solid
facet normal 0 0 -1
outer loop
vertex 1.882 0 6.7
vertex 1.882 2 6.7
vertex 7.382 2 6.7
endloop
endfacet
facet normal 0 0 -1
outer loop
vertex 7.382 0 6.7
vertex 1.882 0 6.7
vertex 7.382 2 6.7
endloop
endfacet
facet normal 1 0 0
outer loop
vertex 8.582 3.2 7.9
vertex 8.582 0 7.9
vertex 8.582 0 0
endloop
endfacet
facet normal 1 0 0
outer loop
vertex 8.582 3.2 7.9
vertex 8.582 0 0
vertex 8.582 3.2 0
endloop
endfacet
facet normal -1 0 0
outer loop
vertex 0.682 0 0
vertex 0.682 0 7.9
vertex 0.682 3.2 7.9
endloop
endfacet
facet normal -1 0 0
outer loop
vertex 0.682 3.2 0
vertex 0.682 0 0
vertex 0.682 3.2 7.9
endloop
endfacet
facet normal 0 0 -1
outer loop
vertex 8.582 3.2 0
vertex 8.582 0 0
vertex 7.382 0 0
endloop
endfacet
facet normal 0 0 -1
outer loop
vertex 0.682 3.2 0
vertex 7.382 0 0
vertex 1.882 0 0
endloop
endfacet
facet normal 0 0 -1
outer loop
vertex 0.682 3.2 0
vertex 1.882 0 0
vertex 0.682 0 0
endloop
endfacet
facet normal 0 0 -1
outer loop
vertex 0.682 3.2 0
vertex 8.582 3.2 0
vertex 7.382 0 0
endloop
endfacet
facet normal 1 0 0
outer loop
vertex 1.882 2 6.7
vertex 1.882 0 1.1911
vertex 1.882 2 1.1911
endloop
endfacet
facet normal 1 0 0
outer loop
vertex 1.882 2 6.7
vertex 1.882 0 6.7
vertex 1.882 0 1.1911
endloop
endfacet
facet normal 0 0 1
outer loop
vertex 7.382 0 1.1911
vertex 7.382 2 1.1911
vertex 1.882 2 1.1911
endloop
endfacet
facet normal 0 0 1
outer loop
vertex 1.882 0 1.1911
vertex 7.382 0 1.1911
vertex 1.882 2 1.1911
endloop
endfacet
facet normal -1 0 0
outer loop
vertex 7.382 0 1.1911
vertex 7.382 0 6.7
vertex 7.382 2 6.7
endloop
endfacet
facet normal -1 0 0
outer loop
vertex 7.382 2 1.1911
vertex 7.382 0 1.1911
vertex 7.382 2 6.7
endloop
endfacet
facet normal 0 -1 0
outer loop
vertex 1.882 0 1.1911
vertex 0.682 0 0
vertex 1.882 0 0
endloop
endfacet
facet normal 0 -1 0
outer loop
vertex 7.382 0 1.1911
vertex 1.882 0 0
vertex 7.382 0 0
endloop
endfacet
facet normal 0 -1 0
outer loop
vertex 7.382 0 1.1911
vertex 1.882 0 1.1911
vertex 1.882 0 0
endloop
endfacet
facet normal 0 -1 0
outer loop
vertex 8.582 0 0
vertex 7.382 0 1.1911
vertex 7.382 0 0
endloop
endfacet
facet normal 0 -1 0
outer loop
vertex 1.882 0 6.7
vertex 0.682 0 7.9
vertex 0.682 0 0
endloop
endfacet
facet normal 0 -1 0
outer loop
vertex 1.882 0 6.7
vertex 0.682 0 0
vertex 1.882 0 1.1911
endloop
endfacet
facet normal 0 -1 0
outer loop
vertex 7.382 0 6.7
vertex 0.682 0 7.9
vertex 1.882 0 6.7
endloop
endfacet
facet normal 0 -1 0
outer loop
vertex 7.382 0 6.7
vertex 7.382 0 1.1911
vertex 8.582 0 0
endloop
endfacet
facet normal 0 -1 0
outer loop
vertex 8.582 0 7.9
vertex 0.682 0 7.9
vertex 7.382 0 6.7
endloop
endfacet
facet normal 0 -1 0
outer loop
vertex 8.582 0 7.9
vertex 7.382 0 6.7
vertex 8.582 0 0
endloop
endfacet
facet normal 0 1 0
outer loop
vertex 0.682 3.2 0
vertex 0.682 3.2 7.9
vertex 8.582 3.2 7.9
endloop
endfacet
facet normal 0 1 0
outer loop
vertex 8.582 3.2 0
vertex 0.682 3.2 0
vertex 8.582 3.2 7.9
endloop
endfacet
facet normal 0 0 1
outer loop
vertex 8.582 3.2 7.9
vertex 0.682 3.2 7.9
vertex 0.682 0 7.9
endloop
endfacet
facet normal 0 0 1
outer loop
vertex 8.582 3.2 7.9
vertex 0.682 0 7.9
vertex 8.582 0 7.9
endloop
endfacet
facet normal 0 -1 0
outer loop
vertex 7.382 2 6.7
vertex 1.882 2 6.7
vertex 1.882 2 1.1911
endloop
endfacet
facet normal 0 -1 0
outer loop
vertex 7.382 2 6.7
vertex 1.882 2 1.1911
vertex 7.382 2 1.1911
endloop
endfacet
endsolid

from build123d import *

# Parameters (mm, degrees)
MAINBASESKETCH_W         = 7.9
MAINBASESKETCH_H         = 3.2
MAINBASEEXTRUDE_DEPTH    = 7.9
MAINBASESHELL_T          = -1.2
SKETCH171_W              = 5.5
SKETCH171_H              = 1.191135725
BOSS_EXTRUDE23_DEPTH     = 2
CUT_EXTRUDE58_DEPTH      = 12.83470157
CUT_EXTRUDE58_DEPTH_BACK = 12.83470157


with BuildPart() as part:
    # MainBaseSketch → MainBaseExtrude (new, symmetric)
    with BuildSketch(Plane.XY):
        with Locations((4.631967213, 1.6)):
            Rectangle(MAINBASESKETCH_W, MAINBASESKETCH_H)
    extrude(amount=MAINBASEEXTRUDE_DEPTH, both=True)

    # MainBaseShell
    mainbaseshell_openings = [part.faces().sort_by_distance(p)[0] for p in [
        (4.631967213, 0, 0),
    ]]
    offset(amount=MAINBASESHELL_T, openings=mainbaseshell_openings, kind=Kind.INTERSECTION)

    # Sketch171 → Boss-Extrude23 (add)
    with BuildSketch(Plane(origin=(0, 2, 0), x_dir=(-1, 0, 0), z_dir=(0, -1, 0))):
        with Locations((-4.631967213, -0.595567863)):
            Rectangle(SKETCH171_W, SKETCH171_H)
    extrude(amount=BOSS_EXTRUDE23_DEPTH)

    # Sketch173 → Cut-Extrude58 (cut, two sides: drawn at the far end of the back side and taken through both)
    with BuildSketch(Plane(origin=(0, 2, 0), x_dir=(-1, 0, 0), z_dir=(0, -1, 0)).offset(-CUT_EXTRUDE58_DEPTH_BACK)):
        Polygon((-7.381967213, 0), (-8.581967213, 0), (-8.581967213, 7.9), (-0.681967213, 7.9), (-0.681967213, 0), align=None)
    extrude(amount=CUT_EXTRUDE58_DEPTH + CUT_EXTRUDE58_DEPTH_BACK, mode=Mode.SUBTRACT)


solid = part.part
